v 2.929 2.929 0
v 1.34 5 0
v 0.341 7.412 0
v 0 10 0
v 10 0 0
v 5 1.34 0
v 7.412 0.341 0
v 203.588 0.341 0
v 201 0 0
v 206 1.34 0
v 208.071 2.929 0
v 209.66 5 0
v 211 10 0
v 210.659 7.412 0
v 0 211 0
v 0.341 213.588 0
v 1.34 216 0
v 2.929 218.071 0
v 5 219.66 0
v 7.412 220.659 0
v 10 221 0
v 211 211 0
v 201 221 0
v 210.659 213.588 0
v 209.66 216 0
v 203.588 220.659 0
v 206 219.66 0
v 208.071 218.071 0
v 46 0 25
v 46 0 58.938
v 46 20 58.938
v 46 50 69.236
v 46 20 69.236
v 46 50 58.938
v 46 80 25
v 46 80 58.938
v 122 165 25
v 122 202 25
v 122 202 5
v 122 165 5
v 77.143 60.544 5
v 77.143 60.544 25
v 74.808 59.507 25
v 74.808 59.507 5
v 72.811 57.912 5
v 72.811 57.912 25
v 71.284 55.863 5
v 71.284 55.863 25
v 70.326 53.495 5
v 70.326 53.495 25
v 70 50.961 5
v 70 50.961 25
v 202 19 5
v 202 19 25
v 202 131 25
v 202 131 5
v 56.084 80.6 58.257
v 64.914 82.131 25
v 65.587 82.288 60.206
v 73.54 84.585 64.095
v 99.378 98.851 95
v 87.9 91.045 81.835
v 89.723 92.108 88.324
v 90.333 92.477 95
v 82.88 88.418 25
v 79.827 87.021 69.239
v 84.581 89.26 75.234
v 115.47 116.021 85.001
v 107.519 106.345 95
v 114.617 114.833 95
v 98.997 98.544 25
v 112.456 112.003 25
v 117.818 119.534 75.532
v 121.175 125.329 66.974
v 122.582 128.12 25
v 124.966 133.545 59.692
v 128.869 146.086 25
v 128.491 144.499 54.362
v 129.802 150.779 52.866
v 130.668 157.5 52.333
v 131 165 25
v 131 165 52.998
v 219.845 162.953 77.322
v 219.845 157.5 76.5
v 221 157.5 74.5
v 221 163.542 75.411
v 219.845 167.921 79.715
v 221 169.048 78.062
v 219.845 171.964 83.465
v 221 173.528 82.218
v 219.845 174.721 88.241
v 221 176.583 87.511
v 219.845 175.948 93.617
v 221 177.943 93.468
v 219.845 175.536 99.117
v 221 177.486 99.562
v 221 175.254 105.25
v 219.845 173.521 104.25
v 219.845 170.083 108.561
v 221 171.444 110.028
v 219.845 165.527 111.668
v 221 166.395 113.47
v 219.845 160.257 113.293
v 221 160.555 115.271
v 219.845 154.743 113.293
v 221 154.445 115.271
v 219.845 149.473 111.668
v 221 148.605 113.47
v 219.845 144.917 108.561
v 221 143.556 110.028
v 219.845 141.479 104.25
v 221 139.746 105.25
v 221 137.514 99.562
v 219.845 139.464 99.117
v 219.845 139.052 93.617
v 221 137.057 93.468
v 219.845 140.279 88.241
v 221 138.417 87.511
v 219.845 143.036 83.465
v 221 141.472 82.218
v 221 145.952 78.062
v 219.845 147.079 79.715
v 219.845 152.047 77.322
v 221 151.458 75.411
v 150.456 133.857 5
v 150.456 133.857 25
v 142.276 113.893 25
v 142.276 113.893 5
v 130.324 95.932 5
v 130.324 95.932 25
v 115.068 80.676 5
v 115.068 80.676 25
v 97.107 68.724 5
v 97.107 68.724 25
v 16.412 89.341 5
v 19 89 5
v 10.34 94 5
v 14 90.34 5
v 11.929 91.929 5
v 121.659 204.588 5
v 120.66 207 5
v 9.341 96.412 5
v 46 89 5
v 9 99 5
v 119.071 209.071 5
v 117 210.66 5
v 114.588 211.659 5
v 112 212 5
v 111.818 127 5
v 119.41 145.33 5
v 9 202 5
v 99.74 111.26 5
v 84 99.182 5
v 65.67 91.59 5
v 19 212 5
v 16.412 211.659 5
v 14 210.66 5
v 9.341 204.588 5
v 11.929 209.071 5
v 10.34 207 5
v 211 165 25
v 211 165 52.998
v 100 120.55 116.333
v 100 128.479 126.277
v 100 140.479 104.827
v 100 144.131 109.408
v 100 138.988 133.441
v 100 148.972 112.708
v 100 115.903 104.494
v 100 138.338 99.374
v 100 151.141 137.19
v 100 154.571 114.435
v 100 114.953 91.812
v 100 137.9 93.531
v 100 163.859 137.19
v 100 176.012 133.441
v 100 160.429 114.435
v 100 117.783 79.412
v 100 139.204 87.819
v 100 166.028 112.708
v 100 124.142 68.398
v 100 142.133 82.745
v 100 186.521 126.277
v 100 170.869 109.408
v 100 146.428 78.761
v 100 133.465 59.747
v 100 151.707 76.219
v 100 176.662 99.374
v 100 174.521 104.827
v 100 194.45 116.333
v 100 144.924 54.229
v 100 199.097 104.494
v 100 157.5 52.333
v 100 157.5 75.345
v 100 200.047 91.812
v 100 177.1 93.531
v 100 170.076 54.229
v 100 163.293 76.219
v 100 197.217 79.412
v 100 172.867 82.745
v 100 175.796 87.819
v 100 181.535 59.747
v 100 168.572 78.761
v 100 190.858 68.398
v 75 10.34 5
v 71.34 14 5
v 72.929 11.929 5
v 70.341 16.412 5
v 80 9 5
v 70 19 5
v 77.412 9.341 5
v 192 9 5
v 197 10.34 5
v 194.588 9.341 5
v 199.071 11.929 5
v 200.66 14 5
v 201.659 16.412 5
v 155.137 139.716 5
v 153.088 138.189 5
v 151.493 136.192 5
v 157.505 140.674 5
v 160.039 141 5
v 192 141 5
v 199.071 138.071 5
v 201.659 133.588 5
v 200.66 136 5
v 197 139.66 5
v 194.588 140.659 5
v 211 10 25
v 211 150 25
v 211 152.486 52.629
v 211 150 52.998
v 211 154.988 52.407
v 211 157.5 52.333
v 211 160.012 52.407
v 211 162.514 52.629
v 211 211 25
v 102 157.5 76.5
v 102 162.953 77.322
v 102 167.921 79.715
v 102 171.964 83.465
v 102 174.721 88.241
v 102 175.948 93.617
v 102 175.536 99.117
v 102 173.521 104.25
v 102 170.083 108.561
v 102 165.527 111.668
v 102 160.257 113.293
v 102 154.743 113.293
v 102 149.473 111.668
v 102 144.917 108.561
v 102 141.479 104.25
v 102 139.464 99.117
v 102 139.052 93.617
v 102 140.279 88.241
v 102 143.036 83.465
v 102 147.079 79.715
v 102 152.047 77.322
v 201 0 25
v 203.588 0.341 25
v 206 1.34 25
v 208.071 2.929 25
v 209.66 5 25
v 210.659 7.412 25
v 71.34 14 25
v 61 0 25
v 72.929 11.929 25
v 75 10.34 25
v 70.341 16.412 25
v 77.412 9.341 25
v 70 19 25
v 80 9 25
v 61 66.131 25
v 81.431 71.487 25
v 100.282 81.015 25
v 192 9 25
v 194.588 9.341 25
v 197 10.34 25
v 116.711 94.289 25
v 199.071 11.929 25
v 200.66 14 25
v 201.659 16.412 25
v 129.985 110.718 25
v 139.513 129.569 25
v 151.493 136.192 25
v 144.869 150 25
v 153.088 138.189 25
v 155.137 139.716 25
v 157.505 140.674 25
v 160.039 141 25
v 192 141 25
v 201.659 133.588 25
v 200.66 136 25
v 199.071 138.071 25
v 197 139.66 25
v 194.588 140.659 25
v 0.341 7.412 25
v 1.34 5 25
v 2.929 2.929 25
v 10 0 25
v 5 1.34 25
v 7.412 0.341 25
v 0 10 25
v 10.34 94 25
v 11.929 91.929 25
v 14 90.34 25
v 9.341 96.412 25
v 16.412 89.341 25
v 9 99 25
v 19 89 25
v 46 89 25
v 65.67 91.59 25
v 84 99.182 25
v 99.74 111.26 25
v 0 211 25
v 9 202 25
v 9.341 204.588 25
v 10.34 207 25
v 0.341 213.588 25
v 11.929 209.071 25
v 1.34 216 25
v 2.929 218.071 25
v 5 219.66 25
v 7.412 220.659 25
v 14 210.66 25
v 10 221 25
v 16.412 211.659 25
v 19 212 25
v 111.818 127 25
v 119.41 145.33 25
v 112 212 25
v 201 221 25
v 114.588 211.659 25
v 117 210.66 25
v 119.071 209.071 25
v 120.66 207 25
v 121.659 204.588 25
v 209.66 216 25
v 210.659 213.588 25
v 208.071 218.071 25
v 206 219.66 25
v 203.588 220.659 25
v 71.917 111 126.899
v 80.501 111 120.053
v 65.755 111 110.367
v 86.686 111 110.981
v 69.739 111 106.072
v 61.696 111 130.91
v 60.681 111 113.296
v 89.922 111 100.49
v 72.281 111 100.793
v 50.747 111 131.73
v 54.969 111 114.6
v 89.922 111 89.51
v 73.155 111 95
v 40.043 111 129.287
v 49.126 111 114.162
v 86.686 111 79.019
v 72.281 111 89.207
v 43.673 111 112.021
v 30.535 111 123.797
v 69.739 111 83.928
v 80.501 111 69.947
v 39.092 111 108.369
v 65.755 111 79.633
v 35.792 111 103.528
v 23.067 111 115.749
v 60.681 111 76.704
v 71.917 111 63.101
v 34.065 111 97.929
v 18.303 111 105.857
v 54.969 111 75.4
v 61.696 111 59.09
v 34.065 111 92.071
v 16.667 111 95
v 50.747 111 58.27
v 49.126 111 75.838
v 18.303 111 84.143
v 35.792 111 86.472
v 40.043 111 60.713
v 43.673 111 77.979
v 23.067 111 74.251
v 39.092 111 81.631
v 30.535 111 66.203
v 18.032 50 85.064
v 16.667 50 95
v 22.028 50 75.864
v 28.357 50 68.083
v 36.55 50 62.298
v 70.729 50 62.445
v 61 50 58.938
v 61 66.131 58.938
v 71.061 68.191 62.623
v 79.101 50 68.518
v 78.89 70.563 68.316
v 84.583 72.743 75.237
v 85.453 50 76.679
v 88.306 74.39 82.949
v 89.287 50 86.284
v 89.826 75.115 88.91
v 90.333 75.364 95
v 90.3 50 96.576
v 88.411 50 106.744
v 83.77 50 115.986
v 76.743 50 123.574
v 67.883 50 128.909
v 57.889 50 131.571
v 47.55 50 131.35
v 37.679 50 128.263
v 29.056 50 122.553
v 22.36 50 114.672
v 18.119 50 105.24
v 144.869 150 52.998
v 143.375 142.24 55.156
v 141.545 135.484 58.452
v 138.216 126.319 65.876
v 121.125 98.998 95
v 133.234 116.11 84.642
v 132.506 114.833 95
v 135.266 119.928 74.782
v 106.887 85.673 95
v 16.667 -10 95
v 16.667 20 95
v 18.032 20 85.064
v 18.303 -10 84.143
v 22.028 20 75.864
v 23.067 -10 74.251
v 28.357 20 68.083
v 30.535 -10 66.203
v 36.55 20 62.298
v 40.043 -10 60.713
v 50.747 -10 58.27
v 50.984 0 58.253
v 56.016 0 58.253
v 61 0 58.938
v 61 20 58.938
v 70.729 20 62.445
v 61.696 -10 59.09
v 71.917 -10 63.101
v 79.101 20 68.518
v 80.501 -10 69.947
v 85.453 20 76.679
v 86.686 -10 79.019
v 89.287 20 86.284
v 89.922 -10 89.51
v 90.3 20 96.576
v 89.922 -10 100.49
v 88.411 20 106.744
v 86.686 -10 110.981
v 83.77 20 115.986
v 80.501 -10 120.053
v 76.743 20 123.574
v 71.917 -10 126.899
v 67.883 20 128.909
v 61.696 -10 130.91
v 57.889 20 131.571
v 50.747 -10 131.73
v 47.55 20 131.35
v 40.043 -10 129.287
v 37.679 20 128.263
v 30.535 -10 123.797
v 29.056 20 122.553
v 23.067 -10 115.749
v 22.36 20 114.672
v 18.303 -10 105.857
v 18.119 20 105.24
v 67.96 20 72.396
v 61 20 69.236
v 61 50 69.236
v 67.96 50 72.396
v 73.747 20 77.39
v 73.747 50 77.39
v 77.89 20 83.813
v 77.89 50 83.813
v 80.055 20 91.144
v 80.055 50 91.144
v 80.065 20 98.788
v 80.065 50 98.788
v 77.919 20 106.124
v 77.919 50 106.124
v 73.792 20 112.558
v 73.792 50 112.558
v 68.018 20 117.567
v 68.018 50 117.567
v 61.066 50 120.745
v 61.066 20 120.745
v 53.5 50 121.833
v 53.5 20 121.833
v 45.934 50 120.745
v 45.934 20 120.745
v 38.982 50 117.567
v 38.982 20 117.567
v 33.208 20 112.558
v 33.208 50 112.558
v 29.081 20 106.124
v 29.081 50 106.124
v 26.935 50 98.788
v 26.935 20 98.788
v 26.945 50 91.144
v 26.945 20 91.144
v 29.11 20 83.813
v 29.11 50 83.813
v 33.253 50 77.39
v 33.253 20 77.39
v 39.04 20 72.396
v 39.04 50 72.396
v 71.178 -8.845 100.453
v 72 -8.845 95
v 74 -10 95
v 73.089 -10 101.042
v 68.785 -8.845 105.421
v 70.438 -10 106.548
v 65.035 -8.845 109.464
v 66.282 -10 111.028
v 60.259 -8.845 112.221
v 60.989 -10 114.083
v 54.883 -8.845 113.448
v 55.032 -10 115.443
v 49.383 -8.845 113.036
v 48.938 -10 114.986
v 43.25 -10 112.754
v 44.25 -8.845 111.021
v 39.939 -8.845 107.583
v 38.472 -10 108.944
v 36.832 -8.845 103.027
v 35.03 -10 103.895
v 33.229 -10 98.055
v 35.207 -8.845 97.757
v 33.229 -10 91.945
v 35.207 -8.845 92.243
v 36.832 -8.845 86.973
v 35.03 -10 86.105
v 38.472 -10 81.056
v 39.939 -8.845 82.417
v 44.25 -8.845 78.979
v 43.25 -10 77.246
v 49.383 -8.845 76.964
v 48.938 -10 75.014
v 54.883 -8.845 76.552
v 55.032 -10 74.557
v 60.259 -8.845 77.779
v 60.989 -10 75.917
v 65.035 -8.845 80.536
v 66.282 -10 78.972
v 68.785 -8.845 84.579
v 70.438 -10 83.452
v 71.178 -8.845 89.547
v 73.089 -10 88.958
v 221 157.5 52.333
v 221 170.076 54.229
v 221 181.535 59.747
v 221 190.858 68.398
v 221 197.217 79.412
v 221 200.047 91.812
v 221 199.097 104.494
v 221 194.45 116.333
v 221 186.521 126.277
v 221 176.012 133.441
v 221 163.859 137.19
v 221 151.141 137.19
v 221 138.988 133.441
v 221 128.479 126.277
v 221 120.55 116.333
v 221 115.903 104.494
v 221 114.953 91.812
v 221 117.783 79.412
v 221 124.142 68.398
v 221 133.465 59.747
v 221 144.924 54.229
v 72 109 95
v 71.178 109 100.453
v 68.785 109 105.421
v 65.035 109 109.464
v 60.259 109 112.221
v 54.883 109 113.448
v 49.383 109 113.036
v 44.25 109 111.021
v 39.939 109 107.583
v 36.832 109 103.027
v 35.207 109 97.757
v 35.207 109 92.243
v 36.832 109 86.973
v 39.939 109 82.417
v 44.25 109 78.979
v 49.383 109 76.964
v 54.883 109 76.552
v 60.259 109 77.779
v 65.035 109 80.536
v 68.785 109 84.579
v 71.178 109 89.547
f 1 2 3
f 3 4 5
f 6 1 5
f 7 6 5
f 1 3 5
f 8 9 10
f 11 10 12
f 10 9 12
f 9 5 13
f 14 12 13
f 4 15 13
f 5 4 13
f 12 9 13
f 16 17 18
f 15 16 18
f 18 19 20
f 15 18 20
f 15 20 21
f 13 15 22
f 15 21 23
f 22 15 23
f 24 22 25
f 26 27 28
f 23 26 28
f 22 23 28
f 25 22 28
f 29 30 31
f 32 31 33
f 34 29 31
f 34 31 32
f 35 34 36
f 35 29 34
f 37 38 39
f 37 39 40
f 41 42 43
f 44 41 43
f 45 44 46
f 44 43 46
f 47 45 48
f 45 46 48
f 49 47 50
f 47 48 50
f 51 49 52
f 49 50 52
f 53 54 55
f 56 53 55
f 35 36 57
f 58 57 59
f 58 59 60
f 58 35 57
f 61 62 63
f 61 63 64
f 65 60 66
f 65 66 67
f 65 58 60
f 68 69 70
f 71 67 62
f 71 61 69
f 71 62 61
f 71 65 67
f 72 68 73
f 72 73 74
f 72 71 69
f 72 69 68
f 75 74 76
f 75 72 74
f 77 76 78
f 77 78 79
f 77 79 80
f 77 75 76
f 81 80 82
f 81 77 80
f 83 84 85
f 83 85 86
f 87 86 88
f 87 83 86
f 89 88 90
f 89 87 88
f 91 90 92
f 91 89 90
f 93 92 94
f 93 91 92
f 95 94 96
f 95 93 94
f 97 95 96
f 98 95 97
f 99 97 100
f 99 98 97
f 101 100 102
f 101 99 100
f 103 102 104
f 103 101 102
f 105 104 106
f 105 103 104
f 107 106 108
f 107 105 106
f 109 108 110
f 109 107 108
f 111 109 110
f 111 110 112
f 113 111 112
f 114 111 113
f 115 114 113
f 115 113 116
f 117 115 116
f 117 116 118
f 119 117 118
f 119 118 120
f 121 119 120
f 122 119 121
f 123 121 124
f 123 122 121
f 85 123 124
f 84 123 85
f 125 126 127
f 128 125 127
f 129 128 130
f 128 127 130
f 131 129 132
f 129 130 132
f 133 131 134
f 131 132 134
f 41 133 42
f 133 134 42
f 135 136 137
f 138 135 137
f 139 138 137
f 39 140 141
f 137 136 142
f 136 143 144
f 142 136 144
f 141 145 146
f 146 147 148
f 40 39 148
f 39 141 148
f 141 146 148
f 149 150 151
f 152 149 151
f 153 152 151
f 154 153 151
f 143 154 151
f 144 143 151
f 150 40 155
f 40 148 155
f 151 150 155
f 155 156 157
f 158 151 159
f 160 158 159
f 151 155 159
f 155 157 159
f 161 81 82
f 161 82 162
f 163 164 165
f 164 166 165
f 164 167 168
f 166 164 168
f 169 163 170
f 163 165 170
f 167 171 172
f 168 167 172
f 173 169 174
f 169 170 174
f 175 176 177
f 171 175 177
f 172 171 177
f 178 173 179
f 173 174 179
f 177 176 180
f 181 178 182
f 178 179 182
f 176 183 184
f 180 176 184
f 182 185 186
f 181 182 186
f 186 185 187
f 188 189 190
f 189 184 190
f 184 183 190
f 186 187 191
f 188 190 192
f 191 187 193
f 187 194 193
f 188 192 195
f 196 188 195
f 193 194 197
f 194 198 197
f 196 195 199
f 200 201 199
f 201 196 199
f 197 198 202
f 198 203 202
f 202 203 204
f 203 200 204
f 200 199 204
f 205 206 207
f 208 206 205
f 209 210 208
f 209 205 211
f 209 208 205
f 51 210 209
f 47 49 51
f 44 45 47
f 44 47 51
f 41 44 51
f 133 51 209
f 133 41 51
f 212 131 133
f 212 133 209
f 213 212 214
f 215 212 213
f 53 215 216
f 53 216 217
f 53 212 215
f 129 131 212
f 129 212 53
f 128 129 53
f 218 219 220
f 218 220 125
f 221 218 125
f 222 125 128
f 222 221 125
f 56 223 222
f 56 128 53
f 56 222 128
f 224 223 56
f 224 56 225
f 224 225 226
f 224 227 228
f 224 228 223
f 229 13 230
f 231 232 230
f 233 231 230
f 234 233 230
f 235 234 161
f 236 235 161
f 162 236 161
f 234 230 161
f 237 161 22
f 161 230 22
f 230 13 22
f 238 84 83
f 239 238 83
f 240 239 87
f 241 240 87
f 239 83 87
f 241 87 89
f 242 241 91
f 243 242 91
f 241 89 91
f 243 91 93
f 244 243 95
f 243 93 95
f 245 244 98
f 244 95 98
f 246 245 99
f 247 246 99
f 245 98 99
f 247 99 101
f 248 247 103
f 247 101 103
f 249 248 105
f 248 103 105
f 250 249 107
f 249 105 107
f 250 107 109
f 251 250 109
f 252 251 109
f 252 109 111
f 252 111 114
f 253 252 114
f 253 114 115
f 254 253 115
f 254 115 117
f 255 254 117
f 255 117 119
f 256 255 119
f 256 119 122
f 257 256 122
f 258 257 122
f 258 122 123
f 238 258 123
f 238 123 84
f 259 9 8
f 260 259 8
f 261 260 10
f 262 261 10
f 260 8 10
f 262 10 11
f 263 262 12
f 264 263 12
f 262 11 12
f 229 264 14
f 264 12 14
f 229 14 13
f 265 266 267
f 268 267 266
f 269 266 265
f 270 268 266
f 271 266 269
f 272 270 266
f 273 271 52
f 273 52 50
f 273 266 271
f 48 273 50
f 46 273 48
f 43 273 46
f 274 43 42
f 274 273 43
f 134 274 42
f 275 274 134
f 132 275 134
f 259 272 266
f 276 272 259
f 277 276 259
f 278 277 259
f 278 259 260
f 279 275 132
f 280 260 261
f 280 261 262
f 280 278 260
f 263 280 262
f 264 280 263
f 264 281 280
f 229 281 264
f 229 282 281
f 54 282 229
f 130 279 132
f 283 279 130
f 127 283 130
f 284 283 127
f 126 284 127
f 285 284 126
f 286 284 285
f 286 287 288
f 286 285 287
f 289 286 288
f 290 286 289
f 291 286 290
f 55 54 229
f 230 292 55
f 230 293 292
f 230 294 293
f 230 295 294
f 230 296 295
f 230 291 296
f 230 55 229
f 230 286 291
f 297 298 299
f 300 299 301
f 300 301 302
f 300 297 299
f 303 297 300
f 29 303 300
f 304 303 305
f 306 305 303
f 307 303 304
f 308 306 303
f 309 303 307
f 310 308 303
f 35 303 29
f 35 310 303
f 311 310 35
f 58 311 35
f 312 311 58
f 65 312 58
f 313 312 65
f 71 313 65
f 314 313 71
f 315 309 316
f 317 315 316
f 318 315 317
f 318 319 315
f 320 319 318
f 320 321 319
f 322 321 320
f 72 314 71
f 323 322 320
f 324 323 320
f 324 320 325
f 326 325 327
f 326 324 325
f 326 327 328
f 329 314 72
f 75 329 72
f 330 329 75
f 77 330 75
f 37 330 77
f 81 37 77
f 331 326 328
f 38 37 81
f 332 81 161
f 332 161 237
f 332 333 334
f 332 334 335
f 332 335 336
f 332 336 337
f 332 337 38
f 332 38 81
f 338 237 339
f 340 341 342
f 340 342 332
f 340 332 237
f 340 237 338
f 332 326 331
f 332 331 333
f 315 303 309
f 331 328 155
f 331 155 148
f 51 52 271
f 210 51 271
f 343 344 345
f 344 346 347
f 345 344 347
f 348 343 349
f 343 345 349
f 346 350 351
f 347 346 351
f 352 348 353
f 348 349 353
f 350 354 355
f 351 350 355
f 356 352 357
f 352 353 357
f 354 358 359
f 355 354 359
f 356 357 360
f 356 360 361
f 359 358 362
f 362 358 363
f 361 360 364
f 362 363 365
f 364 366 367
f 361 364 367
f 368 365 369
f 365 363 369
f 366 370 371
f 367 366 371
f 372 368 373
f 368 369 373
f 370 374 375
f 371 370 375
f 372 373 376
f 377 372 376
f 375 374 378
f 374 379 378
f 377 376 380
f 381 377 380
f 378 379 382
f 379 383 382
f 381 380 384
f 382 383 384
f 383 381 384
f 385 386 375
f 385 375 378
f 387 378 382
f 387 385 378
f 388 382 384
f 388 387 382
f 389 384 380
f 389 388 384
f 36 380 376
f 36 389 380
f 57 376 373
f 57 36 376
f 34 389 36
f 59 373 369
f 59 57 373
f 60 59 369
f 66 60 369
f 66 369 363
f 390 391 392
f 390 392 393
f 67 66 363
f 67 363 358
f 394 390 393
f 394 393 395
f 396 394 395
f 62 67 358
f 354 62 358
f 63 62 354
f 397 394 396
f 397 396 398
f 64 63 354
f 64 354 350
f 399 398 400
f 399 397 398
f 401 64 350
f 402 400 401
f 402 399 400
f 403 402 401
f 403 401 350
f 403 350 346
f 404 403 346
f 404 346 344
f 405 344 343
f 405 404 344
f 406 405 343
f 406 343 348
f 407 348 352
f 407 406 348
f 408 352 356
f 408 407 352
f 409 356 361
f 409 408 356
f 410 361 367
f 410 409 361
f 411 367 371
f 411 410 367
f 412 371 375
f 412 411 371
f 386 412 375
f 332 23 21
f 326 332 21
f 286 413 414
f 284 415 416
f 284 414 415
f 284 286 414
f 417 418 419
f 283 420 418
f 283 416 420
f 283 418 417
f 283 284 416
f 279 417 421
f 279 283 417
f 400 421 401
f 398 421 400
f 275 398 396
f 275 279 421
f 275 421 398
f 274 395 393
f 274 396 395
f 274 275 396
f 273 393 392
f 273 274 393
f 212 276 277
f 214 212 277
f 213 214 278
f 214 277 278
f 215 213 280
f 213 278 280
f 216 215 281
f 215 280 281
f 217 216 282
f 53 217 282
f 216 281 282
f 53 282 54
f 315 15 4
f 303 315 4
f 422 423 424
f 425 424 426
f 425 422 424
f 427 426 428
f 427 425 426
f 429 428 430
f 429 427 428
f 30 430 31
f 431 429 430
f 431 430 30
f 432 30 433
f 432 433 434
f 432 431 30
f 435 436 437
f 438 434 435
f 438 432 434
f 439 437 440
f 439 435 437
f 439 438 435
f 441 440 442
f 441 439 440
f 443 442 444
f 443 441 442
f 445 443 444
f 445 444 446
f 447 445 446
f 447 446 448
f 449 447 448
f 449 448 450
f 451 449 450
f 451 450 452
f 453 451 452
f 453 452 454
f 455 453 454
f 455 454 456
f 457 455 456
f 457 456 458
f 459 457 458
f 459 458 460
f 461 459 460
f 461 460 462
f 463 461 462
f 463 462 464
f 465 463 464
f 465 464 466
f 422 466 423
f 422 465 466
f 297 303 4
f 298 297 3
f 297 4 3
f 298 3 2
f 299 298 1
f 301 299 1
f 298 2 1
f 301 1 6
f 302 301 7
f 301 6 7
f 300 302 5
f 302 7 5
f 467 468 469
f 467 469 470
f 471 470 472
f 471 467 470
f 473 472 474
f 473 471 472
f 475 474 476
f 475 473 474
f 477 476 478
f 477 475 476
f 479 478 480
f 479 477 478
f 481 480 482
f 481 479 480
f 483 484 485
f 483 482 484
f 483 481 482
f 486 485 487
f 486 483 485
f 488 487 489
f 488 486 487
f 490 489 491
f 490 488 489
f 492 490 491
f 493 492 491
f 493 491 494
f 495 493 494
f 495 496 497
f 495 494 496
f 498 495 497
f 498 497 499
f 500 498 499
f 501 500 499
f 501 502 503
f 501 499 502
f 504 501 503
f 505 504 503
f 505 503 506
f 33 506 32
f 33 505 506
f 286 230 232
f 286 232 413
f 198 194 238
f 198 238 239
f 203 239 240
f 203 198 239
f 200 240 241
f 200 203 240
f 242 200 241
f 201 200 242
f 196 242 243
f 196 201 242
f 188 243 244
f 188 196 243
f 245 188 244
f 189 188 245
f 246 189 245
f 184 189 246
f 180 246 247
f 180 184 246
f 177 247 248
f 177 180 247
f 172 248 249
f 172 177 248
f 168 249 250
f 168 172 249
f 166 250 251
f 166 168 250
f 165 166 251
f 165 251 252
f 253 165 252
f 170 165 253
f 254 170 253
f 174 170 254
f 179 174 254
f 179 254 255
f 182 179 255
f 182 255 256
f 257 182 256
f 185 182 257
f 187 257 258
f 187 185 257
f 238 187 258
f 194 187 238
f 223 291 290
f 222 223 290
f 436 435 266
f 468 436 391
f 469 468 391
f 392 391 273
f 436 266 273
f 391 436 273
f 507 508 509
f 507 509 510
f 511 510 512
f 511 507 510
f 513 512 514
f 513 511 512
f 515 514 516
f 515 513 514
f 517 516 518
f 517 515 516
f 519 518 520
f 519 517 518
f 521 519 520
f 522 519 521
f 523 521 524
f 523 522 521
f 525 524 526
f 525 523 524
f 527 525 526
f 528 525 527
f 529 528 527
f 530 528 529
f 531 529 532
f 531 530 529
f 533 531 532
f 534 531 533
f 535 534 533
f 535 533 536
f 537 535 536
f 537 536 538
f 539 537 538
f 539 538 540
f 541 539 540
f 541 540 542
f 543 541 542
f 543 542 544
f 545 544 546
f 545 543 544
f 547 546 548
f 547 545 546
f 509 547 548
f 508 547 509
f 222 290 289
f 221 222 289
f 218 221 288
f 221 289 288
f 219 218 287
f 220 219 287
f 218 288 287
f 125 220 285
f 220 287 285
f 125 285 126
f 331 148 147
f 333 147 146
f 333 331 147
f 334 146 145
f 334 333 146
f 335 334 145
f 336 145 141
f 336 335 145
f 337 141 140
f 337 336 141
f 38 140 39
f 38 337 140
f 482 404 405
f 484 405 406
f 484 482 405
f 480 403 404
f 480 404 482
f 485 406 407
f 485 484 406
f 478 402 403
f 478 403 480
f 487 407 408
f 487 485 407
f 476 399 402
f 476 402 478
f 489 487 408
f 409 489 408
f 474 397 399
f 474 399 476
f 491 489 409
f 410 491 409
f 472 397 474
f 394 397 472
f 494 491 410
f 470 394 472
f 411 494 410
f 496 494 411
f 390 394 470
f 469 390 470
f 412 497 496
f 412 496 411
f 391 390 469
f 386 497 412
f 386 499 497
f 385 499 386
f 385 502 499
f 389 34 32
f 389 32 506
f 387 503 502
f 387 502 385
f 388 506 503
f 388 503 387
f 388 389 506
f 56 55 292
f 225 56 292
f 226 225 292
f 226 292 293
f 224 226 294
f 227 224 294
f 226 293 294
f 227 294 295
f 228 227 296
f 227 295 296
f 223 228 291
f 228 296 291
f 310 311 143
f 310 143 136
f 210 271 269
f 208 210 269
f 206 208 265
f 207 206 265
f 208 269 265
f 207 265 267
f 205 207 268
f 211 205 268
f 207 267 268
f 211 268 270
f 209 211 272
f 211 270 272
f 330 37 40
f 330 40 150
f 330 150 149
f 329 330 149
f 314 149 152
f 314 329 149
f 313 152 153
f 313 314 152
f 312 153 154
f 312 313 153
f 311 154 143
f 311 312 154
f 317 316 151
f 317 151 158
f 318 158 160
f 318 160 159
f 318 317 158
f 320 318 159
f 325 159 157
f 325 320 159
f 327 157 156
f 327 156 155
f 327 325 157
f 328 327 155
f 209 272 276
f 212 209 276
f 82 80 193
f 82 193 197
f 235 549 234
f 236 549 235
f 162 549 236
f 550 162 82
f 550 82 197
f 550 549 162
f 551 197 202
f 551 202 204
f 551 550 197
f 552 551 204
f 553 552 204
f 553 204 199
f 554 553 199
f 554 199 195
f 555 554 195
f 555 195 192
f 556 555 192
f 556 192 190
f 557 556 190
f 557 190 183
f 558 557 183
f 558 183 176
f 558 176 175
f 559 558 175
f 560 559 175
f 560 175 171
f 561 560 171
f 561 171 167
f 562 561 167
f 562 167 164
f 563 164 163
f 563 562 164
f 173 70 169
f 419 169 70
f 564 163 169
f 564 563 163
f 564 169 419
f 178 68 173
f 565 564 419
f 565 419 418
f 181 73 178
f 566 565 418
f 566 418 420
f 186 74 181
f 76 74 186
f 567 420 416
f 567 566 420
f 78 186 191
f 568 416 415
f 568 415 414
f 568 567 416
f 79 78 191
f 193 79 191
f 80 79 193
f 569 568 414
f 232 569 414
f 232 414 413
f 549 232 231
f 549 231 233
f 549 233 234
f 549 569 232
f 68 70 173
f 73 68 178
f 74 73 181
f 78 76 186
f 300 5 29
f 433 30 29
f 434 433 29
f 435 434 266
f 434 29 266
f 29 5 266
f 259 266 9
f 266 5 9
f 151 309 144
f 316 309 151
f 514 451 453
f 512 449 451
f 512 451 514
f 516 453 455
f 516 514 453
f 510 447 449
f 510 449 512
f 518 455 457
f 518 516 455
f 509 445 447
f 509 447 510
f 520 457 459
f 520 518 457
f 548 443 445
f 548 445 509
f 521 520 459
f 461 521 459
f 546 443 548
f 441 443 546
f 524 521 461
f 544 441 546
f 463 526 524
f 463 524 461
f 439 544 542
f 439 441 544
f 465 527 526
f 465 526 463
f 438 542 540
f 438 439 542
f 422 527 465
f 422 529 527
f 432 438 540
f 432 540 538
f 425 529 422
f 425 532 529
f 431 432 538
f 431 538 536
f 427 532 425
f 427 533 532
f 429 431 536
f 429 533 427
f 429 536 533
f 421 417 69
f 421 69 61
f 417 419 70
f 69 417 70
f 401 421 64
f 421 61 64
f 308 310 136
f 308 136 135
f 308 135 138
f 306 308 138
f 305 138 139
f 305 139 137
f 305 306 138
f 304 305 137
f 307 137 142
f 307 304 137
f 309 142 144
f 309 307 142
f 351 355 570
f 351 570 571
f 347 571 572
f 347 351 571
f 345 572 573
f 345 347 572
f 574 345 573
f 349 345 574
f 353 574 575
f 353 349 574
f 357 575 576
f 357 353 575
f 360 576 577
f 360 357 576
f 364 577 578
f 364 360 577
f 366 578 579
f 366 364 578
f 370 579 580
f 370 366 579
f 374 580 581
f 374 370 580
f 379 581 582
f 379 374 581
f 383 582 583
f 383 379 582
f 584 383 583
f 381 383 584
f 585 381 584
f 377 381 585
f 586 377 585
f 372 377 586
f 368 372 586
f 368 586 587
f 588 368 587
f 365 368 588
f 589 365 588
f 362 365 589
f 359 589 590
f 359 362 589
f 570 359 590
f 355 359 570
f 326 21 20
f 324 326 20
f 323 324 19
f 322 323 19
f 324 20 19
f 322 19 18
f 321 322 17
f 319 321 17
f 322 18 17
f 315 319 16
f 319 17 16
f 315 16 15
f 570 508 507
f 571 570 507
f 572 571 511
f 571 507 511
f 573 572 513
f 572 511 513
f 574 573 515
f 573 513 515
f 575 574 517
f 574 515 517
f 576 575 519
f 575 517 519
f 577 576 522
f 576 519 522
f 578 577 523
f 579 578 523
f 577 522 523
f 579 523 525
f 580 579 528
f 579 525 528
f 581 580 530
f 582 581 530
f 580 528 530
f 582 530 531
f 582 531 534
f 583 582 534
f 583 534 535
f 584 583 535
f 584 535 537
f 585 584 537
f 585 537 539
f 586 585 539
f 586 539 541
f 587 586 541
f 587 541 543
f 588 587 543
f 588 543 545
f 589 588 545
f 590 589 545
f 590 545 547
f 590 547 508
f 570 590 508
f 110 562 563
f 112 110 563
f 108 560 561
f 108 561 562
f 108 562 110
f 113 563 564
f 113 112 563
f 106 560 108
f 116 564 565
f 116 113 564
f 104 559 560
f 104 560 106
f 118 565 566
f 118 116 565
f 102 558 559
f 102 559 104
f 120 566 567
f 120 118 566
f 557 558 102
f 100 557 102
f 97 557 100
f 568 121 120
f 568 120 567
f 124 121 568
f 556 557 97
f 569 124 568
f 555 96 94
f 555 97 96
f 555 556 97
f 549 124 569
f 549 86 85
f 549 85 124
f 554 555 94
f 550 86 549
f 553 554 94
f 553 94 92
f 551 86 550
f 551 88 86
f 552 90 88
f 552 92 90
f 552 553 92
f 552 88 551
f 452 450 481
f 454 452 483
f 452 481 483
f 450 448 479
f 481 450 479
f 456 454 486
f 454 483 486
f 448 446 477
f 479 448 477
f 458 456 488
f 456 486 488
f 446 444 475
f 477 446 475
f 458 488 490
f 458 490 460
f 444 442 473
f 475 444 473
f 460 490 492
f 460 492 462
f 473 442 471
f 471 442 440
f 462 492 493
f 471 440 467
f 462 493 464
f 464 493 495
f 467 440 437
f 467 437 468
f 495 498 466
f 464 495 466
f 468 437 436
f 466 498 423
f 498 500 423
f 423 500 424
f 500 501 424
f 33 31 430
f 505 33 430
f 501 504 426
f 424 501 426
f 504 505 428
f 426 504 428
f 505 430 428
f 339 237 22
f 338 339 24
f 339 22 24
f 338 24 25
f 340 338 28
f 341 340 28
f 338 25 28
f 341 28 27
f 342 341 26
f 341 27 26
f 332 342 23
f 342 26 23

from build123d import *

# Parameters (mm, degrees)
BOSS_EXTRUDE1_DEPTH   = 25
BOSS_EXTRUDE3_DEPTH   = 70
SKETCH7_R             = 36.833333333
BOSS_EXTRUDE4_DEPTH   = 121
SKETCH8_R             = 18.5
CUT_EXTRUDE2_DEPTH    = 232
SKETCH9_R             = 42.666666667
BOSS_EXTRUDE5_DEPTH   = 121
SKETCH10_R            = 18.5
CUT_EXTRUDE3_DEPTH    = 222
CHAMFER1_SIZE         = 2
CHAMFER1_SIZE2        = 1.154700538
CHAMFER1_PART_2_SIZE  = 2
CHAMFER1_PART_2_SIZE2 = 1.154700538
CHAMFER1_PART_3_SIZE  = 2
CHAMFER1_PART_3_SIZE2 = 1.154700538
CHAMFER1_PART_4_SIZE  = 2
CHAMFER1_PART_4_SIZE2 = 1.154700538
CUT_EXTRUDE4_DEPTH    = 20
CUT_EXTRUDE5_DEPTH    = 20
SKETCH16_R            = 36.833333333
SKETCH16_R_2          = 26.833333333
CUT_EXTRUDE7_DEPTH    = 30
BOSS_EXTRUDE7_REACH   = 114.667
SKETCH18_W            = 15
SKETCH18_H            = 30


with BuildPart() as part:
    # Sketch1 → Boss-Extrude1 (new body)
    with BuildSketch(Plane.XY):
        with BuildLine():
            Line((10, 0), (201, 0))
            ThreePointArc((201, 0), (208.071067812, 2.928932188), (211, 10))
            Line((211, 10), (211, 211))
            ThreePointArc((211, 211), (208.071067812, 218.071067812), (201, 221))
            Line((201, 221), (10, 221))
            ThreePointArc((10, 221), (2.928932188, 218.071067812), (0, 211))
            Line((0, 211), (0, 10))
            ThreePointArc((0, 10), (2.928932188, 2.928932188), (10, 0))
        make_face()
    extrude(amount=BOSS_EXTRUDE1_DEPTH)

    # Sketch5 → Boss-Extrude3 (add)
    with BuildSketch(Plane.XY.offset(25)):
        with BuildLine():
            Line((46, 0), (46, 80))
            ThreePointArc((46, 80), (106.104076401, 104.895923599), (131, 165))
            Line((131, 165), (211, 165))
            Line((211, 165), (211, 150))
            Line((211, 150), (144.868599666, 150))
            ThreePointArc((144.868599666, 150), (116.710678119, 94.289321881), (61, 66.131400334))
            Line((61, 66.131400334), (61, 0))
            Line((61, 0), (46, 0))
        make_face()
    extrude(amount=BOSS_EXTRUDE3_DEPTH)

    # Sketch7 → Boss-Extrude4 (add)
    with BuildSketch(Plane(origin=(0, -10, 0), x_dir=(-1, 0, 0), z_dir=(0, -1, 0))):
        with Locations((-53.5, -95)):
            Circle(SKETCH7_R)
    extrude(amount=-BOSS_EXTRUDE4_DEPTH)

    # Sketch8 → Cut-Extrude2 (cut, through all)
    with BuildSketch(Plane.XZ.offset(10)):
        with Locations((53.5, 95)):
            Circle(SKETCH8_R)
    extrude(amount=-CUT_EXTRUDE2_DEPTH, mode=Mode.SUBTRACT)

    # Sketch9 → Boss-Extrude5 (add)
    with BuildSketch(Plane(origin=(221, 0, 0), x_dir=(0, 0, -1), z_dir=(1, 0, 0))):
        with Locations((-95, 157.5)):
            Circle(SKETCH9_R)
    extrude(amount=-BOSS_EXTRUDE5_DEPTH)

    # Sketch10 → Cut-Extrude3 (cut, through all)
    with BuildSketch(Plane(origin=(221, 0, 0), x_dir=(0, 0, -1), z_dir=(1, 0, 0))):
        with Locations((-95, 157.5)):
            Circle(SKETCH10_R)
    extrude(amount=-CUT_EXTRUDE3_DEPTH, mode=Mode.SUBTRACT)

    # Chamfer1
    chamfer1_edges = [part.edges().sort_by_distance(p)[0] for p in [
        (35, 111, 95),
    ]]
    chamfer1_side = [part.faces().sort_by_distance(p)[0] for p in [
        (35, 50.5, 95),
    ]]
    chamfer(chamfer1_edges, length=CHAMFER1_SIZE, length2=CHAMFER1_SIZE2, reference=chamfer1_side[0])

    # Chamfer1 part 2
    chamfer1_part_2_edges = [part.edges().sort_by_distance(p)[0] for p in [
        (35, -10, 95),
    ]]
    chamfer1_part_2_side = [part.faces().sort_by_distance(p)[0] for p in [
        (89.291529342, -10, 95),
    ]]
    chamfer(chamfer1_part_2_edges, length=CHAMFER1_PART_2_SIZE, length2=CHAMFER1_PART_2_SIZE2, reference=chamfer1_part_2_side[0])

    # Chamfer1 part 3
    chamfer1_part_3_edges = [part.edges().sort_by_distance(p)[0] for p in [
        (100, 157.5, 113.5),
    ]]
    chamfer1_part_3_side = [part.faces().sort_by_distance(p)[0] for p in [
        (160.5, 157.5, 113.5),
    ]]
    chamfer(chamfer1_part_3_edges, length=CHAMFER1_PART_3_SIZE, length2=CHAMFER1_PART_3_SIZE2, reference=chamfer1_part_3_side[0])

    # Chamfer1 part 4
    chamfer1_part_4_edges = [part.edges().sort_by_distance(p)[0] for p in [
        (221, 157.5, 113.5),
    ]]
    chamfer1_part_4_side = [part.faces().sort_by_distance(p)[0] for p in [
        (221, 157.5, 136.459871093),
    ]]
    chamfer(chamfer1_part_4_edges, length=CHAMFER1_PART_4_SIZE, length2=CHAMFER1_PART_4_SIZE2, reference=chamfer1_part_4_side[0])

    # Sketch11 → Cut-Extrude4 (cut)
    with BuildSketch(Plane.XY.offset(25)):
        with BuildLine():
            Line((192, 141), (160.039466852, 141))
            ThreePointArc((160.039466852, 141), (154.063323806, 139.017837257), (150.456318377, 133.857142857))
            ThreePointArc((150.456318377, 133.857142857), (123.074639149, 87.925360851), (77.142857143, 60.543681623))
            ThreePointArc((77.142857143, 60.543681623), (71.982162743, 56.936676194), (70, 50.960533148))
            Line((70, 50.960533148), (70, 19))
            ThreePointArc((70, 19), (72.92893248, 11.928931897), (80.000000825, 9))
            Line((80.000000825, 9), (192.000000825, 9.000009238))
            ThreePointArc((192.000000825, 9.000009238), (199.071068103, 11.928941718), (202, 19.000009238))
            Line((202, 19.000009238), (202, 131))
            ThreePointArc((202, 131), (199.071067812, 138.071067812), (192, 141))
        make_face()
    extrude(amount=-CUT_EXTRUDE4_DEPTH, mode=Mode.SUBTRACT)

    # Sketch12 → Cut-Extrude5 (cut)
    with BuildSketch(Plane.XY.offset(25)):
        with BuildLine():
            Line((19, 212), (112, 212))
            ThreePointArc((112, 212), (119.071067812, 209.071067812), (122, 202))
            Line((122, 202), (122, 165))
            ThreePointArc((122, 165), (99.74011537, 111.25988463), (46, 89))
            Line((46, 89), (19, 89))
            ThreePointArc((19, 89), (11.928932188, 91.928932188), (9, 99))
            Line((9, 99), (9, 202))
            ThreePointArc((9, 202), (11.928932188, 209.071067812), (19, 212))
        make_face()
    extrude(amount=-CUT_EXTRUDE5_DEPTH, mode=Mode.SUBTRACT)

    # Sketch16 → Cut-Extrude7 (cut)
    with BuildSketch(Plane(origin=(0, 20, 0), x_dir=(-1, 0, 0), z_dir=(0, -1, 0))):
        with Locations((-53.5, -95)):
            Circle(SKETCH16_R)
        with Locations((-53.5, -95)):
            Circle(SKETCH16_R_2, mode=Mode.SUBTRACT)
    extrude(amount=-CUT_EXTRUDE7_DEPTH, mode=Mode.SUBTRACT)

    # Sketch18 → Boss-Extrude7 (add, up to next)
    with BuildSketch(Plane.XY.offset(25), mode=Mode.PRIVATE) as boss_extrude7_sk1:
        with Locations((53.5, 35)):
            Rectangle(SKETCH18_W, SKETCH18_H)
    boss_extrude7_tool1 = extrude(boss_extrude7_sk1.sketch, amount=BOSS_EXTRUDE7_REACH, mode=Mode.PRIVATE) - part.part
    add(boss_extrude7_tool1.solids().sort_by_distance((53.5, 35, 25))[0])


solid = part.part
